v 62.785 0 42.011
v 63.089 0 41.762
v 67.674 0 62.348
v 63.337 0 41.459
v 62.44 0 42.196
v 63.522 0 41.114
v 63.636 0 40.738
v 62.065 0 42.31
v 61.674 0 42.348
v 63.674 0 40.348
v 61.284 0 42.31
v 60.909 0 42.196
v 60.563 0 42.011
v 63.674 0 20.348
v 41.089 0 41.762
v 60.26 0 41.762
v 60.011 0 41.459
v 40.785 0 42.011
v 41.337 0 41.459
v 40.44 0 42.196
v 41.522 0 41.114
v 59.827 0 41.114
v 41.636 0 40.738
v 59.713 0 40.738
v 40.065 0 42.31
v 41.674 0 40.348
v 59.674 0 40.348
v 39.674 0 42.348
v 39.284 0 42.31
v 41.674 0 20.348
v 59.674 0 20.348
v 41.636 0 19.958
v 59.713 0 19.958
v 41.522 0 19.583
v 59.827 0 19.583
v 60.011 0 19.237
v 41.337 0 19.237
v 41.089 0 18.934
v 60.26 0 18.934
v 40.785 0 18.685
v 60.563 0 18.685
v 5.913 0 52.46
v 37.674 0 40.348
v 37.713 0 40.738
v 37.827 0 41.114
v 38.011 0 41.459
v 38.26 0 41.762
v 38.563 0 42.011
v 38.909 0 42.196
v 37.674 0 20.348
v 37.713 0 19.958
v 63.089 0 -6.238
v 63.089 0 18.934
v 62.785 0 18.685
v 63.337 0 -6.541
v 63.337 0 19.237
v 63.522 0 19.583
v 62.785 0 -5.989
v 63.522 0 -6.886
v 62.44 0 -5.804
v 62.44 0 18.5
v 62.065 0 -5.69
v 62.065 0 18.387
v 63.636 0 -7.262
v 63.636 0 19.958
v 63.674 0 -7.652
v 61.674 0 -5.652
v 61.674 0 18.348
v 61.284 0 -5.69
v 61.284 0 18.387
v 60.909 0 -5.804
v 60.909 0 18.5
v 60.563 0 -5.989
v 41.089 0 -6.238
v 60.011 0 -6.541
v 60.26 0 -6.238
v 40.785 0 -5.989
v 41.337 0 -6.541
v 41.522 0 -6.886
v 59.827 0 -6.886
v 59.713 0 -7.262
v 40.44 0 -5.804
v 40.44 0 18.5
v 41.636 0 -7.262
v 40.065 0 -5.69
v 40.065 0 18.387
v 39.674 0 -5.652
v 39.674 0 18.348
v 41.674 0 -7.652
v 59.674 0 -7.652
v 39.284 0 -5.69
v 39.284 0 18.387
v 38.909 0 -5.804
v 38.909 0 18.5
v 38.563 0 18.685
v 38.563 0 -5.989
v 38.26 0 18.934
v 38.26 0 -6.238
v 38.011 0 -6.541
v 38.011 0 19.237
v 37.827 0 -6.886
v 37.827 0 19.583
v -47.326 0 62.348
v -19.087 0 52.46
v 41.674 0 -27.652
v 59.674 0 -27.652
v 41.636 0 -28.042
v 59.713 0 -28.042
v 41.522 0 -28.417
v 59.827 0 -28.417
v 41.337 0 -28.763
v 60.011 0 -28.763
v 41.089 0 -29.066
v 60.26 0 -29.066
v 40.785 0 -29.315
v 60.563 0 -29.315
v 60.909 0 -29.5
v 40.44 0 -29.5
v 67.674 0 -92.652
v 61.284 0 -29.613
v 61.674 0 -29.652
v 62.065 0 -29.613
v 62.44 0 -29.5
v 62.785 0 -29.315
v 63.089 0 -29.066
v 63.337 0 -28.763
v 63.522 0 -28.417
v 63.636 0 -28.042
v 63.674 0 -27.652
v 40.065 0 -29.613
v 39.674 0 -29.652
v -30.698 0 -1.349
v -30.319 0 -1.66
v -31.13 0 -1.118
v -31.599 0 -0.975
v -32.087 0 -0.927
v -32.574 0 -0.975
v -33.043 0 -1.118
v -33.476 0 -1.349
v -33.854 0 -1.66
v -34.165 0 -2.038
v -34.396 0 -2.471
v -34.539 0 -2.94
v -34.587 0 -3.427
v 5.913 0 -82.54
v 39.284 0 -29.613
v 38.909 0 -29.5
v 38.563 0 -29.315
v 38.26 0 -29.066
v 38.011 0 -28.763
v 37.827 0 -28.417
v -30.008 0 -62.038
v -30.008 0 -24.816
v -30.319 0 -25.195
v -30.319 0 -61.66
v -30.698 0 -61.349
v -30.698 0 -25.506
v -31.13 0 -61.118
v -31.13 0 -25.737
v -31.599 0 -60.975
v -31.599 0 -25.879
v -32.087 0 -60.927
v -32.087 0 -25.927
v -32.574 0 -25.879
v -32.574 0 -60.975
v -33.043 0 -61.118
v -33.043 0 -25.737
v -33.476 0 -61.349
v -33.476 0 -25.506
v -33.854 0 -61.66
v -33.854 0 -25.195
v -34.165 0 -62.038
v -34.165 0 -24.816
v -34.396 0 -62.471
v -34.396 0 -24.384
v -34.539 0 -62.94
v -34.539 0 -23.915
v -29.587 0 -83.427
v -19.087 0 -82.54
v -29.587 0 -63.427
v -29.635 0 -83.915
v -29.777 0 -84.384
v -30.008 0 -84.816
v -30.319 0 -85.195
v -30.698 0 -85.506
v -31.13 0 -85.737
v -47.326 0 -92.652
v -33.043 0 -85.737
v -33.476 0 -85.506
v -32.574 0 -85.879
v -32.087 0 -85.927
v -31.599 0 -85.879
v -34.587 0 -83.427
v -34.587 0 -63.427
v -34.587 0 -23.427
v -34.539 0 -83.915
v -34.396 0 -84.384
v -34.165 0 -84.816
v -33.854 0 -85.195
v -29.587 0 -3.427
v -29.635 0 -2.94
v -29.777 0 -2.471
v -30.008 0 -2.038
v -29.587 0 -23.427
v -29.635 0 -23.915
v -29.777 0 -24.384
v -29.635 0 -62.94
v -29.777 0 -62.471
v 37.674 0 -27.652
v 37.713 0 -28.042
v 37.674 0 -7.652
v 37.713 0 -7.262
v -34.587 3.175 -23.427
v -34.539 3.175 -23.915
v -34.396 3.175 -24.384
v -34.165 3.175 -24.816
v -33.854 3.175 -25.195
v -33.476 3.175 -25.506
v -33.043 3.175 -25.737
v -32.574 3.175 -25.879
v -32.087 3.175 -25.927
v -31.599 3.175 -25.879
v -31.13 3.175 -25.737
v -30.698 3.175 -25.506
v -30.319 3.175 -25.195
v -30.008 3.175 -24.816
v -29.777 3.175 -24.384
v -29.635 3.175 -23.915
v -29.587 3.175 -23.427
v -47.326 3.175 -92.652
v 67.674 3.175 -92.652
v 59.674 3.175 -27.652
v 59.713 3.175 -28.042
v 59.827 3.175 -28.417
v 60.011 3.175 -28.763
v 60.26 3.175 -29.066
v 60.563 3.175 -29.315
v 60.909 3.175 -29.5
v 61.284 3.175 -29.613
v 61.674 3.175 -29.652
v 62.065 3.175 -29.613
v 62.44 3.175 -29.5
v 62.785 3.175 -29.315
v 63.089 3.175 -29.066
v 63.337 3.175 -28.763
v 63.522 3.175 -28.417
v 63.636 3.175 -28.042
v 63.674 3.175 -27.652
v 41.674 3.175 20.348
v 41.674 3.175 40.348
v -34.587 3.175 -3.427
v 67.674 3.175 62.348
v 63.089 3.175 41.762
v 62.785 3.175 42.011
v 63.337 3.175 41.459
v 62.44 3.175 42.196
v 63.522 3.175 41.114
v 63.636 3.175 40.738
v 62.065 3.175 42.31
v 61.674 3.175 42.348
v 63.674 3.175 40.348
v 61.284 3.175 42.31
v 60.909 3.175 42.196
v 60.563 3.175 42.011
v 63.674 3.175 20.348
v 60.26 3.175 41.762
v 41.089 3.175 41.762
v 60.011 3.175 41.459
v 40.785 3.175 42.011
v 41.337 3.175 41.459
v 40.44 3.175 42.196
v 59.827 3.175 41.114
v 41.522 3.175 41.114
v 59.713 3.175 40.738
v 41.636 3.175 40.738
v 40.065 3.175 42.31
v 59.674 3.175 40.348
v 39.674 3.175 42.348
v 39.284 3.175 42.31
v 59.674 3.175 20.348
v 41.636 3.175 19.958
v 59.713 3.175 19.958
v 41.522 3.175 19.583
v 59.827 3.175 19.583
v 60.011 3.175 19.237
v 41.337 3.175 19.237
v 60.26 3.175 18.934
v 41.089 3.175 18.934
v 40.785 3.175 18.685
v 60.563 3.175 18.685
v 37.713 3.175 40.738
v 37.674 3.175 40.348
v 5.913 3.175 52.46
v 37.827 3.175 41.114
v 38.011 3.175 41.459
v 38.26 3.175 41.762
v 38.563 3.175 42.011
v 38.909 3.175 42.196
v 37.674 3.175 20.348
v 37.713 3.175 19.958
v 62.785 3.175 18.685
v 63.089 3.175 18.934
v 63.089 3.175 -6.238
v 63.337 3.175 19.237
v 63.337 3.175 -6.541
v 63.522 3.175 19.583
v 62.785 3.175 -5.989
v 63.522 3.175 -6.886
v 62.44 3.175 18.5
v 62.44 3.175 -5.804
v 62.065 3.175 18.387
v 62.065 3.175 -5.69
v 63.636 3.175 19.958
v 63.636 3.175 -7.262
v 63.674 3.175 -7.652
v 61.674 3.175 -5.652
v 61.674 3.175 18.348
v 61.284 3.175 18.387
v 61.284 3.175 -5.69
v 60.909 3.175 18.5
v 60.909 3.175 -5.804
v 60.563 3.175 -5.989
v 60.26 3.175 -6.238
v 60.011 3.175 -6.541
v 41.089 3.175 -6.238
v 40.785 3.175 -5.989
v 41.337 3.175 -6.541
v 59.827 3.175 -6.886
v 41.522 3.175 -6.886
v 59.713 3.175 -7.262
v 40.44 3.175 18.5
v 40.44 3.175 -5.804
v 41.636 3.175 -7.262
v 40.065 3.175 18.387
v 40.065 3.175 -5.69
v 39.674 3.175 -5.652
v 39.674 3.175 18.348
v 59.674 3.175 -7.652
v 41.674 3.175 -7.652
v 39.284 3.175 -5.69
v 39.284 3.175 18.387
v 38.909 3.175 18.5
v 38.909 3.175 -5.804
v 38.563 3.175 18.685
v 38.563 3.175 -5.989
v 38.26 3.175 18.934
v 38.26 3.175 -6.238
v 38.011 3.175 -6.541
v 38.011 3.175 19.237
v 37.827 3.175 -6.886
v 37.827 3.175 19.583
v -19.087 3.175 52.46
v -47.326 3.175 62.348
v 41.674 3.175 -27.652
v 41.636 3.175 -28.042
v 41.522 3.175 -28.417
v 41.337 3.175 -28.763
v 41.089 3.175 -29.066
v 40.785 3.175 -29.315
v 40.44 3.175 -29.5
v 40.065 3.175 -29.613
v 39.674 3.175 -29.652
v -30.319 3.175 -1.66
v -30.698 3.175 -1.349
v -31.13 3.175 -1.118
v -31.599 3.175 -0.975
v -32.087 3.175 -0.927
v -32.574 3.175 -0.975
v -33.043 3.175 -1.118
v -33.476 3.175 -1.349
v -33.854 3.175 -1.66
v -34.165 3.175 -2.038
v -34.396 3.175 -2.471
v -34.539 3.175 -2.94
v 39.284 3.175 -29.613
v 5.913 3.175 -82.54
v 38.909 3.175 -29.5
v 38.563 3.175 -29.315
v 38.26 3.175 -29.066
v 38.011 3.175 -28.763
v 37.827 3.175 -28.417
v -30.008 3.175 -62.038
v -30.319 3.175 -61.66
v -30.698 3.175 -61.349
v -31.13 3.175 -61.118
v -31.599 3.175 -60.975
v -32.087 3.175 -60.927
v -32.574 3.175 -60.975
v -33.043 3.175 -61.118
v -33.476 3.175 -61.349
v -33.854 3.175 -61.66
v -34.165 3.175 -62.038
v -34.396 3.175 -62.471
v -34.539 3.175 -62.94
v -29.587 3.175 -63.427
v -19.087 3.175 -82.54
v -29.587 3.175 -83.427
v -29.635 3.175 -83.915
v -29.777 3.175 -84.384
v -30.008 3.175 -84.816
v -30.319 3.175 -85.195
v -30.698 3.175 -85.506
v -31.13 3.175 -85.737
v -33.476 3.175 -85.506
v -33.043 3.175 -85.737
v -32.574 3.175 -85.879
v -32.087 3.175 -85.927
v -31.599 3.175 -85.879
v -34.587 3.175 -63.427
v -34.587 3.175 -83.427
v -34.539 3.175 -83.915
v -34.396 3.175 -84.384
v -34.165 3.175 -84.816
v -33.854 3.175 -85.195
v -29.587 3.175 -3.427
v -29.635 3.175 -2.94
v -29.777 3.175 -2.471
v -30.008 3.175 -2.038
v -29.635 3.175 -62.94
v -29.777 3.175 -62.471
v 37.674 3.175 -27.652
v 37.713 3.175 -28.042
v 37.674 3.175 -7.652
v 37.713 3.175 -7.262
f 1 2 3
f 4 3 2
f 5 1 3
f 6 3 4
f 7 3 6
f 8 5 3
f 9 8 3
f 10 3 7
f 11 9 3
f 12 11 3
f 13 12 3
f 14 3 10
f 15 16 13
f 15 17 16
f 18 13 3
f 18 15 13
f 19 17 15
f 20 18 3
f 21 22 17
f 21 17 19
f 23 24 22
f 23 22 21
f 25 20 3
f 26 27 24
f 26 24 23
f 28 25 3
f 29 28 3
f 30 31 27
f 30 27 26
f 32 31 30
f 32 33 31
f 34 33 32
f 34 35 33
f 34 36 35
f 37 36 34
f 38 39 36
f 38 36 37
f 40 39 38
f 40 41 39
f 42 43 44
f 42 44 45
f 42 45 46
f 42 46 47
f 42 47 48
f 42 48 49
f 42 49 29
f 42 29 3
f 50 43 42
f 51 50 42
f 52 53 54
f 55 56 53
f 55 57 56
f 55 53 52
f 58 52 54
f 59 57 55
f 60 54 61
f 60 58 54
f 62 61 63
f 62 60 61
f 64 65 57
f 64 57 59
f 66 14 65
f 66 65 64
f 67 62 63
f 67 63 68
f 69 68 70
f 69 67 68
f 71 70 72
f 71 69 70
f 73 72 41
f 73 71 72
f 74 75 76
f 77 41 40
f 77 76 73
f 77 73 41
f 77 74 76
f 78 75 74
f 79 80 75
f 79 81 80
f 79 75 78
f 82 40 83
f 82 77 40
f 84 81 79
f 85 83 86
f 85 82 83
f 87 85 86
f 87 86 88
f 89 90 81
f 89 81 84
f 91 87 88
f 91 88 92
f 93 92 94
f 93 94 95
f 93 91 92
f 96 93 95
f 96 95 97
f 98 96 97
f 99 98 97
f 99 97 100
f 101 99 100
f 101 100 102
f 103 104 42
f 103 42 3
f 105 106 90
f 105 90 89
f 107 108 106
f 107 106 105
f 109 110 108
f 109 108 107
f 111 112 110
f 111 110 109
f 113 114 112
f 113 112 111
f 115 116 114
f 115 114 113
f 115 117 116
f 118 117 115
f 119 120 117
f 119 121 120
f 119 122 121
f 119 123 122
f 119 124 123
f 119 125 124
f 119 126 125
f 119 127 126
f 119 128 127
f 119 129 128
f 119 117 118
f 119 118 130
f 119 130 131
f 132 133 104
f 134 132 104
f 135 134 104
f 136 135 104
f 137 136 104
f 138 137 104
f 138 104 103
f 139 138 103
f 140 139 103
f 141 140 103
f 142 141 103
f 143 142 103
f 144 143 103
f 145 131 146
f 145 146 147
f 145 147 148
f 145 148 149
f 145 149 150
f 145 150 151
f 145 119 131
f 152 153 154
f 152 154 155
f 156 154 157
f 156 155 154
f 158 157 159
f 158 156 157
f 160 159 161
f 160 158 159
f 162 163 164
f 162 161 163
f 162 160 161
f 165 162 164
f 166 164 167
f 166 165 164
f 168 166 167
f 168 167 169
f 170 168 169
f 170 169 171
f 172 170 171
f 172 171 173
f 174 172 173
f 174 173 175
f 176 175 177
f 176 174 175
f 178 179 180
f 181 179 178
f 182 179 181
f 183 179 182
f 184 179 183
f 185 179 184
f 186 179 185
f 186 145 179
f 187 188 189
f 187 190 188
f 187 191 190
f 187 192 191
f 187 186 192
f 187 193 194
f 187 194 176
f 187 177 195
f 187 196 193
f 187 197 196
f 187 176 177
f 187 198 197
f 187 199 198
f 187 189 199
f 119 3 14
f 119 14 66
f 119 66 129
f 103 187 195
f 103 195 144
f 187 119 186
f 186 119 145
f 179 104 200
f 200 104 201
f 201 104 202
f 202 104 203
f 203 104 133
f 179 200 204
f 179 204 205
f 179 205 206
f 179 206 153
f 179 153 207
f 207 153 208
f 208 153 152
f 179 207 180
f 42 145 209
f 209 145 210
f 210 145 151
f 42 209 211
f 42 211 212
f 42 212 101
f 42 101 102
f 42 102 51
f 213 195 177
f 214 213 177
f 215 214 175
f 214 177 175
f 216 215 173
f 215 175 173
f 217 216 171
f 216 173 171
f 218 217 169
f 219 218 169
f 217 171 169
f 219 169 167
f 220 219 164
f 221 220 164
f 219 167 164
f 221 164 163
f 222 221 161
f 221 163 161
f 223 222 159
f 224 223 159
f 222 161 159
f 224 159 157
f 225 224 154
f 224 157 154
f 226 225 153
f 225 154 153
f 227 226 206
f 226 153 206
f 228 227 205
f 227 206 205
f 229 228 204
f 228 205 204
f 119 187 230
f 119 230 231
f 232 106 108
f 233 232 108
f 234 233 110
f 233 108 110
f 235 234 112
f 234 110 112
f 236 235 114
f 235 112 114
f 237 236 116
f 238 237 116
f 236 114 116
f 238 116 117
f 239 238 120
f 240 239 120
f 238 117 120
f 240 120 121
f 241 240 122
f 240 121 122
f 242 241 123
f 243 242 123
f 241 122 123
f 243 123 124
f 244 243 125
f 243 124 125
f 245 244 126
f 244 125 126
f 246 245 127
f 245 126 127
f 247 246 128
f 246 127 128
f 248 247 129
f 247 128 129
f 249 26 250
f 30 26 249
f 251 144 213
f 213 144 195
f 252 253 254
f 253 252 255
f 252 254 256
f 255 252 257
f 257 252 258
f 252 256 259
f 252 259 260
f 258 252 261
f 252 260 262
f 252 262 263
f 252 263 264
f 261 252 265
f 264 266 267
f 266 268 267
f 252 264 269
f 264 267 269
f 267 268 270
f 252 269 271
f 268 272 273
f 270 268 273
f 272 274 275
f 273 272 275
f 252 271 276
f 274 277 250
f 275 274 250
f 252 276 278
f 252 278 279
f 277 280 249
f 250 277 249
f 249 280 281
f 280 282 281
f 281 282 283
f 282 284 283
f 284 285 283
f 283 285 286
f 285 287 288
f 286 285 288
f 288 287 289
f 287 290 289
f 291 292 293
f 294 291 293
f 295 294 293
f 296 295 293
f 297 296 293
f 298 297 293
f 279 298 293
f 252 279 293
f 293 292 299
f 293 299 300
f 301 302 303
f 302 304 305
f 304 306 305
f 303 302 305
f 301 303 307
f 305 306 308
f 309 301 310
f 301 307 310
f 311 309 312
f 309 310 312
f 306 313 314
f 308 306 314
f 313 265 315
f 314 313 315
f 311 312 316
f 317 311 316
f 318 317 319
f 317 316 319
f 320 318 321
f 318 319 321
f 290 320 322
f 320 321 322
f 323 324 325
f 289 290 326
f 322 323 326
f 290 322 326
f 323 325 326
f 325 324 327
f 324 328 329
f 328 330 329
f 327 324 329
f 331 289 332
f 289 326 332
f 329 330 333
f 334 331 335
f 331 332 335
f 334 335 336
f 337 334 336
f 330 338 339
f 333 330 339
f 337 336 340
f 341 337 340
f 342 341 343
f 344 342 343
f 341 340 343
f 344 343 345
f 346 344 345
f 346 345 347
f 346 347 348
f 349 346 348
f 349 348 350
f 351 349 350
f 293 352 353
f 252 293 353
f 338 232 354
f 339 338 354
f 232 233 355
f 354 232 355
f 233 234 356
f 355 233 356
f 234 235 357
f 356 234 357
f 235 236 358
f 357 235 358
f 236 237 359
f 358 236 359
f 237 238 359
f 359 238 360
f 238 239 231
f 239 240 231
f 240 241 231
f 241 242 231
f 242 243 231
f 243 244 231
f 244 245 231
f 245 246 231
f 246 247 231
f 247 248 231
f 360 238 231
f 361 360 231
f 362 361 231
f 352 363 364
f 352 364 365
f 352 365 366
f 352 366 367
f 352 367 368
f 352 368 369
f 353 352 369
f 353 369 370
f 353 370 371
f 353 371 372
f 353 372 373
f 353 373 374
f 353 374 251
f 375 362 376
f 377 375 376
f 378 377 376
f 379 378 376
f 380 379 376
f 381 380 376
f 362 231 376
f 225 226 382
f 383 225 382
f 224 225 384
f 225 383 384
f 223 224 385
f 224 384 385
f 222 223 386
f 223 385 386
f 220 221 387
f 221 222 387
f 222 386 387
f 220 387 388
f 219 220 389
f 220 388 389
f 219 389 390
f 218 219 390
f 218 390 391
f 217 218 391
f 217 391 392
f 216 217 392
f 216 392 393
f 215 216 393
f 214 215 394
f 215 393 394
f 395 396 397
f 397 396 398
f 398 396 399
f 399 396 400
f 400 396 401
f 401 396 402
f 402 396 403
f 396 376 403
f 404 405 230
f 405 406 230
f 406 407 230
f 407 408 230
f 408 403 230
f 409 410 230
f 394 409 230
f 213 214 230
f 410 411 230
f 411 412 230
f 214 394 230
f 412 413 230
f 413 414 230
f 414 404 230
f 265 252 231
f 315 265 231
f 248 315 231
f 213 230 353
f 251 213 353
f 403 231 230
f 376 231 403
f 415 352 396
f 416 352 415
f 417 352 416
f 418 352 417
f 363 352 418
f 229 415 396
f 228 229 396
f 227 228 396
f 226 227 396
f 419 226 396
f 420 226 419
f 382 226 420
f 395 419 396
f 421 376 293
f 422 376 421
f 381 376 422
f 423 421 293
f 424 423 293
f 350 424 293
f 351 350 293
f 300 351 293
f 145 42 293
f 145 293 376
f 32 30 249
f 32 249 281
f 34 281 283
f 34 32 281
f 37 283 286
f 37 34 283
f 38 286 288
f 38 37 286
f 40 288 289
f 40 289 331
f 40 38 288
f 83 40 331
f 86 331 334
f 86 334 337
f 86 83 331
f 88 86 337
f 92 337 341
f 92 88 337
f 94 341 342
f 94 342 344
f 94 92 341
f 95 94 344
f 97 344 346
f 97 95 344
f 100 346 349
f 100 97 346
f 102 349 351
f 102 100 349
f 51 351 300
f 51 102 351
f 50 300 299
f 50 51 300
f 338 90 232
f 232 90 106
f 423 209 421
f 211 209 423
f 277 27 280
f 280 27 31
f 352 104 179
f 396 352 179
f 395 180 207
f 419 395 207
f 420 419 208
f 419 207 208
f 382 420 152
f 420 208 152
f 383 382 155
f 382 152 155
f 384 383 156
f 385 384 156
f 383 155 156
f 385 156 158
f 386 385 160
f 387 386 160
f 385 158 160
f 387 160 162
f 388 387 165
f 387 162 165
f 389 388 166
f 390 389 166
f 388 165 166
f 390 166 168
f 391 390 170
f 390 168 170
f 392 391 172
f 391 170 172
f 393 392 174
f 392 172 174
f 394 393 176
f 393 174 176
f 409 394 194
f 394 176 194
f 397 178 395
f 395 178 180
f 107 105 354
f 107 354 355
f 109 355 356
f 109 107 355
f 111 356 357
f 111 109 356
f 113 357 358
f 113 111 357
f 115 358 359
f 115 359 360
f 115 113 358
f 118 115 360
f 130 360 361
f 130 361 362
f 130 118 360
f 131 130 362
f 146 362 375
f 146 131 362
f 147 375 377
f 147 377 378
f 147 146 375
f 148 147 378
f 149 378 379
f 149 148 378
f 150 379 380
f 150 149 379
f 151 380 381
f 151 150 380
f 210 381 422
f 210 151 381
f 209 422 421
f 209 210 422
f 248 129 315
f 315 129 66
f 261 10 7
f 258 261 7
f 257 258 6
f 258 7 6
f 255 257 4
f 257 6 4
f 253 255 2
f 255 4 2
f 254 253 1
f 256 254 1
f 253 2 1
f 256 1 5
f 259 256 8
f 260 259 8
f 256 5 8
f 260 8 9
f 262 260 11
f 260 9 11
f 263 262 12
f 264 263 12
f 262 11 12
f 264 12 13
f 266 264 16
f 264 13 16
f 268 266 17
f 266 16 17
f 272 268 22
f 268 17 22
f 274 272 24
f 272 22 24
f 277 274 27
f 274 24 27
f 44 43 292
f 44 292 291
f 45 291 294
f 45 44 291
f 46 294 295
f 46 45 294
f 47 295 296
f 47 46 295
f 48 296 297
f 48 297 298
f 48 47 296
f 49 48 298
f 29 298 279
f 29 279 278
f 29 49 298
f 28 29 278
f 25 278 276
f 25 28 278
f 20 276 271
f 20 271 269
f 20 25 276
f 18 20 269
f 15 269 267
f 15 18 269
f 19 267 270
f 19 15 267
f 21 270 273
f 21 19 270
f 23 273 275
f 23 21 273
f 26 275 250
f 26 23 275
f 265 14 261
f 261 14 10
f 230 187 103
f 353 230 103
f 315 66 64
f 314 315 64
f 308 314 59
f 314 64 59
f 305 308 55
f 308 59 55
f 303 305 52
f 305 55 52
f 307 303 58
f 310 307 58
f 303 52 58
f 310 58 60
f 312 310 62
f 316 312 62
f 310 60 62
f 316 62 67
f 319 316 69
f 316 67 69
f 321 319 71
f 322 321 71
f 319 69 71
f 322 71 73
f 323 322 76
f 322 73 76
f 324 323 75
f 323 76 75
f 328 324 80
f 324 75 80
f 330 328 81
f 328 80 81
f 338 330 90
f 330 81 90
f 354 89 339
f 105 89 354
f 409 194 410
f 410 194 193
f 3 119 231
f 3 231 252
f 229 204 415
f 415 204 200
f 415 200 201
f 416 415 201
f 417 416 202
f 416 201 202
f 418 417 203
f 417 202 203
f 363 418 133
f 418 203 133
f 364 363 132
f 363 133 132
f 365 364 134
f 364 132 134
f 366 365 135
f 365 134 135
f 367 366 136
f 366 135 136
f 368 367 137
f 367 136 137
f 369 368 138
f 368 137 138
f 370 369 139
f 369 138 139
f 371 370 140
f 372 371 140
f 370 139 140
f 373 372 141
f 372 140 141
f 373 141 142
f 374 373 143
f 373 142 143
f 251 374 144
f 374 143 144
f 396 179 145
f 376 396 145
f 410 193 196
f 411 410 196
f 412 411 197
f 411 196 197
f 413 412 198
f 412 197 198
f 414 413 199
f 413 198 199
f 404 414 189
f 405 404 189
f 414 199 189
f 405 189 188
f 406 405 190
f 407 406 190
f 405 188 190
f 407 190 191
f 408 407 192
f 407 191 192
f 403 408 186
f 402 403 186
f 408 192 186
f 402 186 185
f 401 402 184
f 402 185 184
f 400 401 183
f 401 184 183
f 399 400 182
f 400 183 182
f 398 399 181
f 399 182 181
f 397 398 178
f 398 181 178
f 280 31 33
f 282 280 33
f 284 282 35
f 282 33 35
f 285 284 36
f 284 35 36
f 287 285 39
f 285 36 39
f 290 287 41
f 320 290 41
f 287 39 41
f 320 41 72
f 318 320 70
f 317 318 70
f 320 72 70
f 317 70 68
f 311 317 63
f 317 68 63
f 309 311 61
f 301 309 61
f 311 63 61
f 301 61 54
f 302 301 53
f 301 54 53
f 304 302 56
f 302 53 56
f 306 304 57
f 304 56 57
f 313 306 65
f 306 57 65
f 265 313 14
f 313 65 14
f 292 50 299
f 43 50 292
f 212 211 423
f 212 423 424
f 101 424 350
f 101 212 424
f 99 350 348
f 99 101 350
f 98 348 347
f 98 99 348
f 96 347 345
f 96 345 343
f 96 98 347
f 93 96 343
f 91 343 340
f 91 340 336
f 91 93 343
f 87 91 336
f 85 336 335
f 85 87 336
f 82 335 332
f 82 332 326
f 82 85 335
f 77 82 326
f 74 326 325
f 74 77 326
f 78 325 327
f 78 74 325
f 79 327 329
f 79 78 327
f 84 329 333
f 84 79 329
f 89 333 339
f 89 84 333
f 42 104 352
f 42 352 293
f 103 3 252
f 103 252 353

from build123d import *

# Parameters (mm, degrees)
SKETCH1_W           = 25
SKETCH1_H           = 135
BOSS_EXTRUDE1_DEPTH = 3.175


with BuildPart() as part:
    # Sketch1 → Boss-Extrude1 (new body)
    with BuildSketch(Plane(origin=(0, 0, 0), x_dir=(1, 0, 0), z_dir=(0, 1, 0))):
        Polygon((67.674333466, 92.651811553), (67.674333466, -62.348188447), (-47.325666534, -62.348188447), (-47.325666534, -27.044565342), (-47.325666534, 92.651811553), align=None)
        with Locations((-6.586624165, 15.039519235)):
            Rectangle(SKETCH1_W, SKETCH1_H, mode=Mode.SUBTRACT)
        with BuildLine():
            Line((-34.586624165, 63.427366475), (-34.586624165, 83.427366475))
            ThreePointArc((-34.586624165, 83.427366475), (-32.086624165, 85.927366475), (-29.586624165, 83.427366475))
            Line((-29.586624165, 83.427366475), (-29.586624165, 63.427366475))
            ThreePointArc((-29.586624165, 63.427366475), (-32.086624165, 60.927366475), (-34.586624165, 63.427366475))
        make_face(mode=Mode.SUBTRACT)
        with BuildLine():
            Line((-34.586624165, 3.427366475), (-34.586624165, 23.427366475))
            ThreePointArc((-34.586624165, 23.427366475), (-32.086624165, 25.927366475), (-29.586624165, 23.427366475))
            Line((-29.586624165, 23.427366475), (-29.586624165, 3.427366475))
            ThreePointArc((-29.586624165, 3.427366475), (-32.086624165, 0.927366475), (-34.586624165, 3.427366475))
        make_face(mode=Mode.SUBTRACT)
        with BuildLine():
            Line((59.674333466, 7.651811553), (59.674333466, 27.651811553))
            ThreePointArc((59.674333466, 27.651811553), (61.674333466, 29.651811553), (63.674333466, 27.651811553))
            Line((63.674333466, 27.651811553), (63.674333466, 7.651811553))
            ThreePointArc((63.674333466, 7.651811553), (61.674333466, 5.651811553), (59.674333466, 7.651811553))
        make_face(mode=Mode.SUBTRACT)
        with BuildLine():
            Line((59.674333466, -40.348188447), (59.674333466, -20.348188447))
            ThreePointArc((59.674333466, -20.348188447), (61.674333466, -18.348188447), (63.674333466, -20.348188447))
            Line((63.674333466, -20.348188447), (63.674333466, -40.348188447))
            ThreePointArc((63.674333466, -40.348188447), (61.674333466, -42.348188447), (59.674333466, -40.348188447))
        make_face(mode=Mode.SUBTRACT)
        with BuildLine():
            Line((41.674333466, 7.651811553), (41.674333466, 27.651811553))
            ThreePointArc((41.674333466, 27.651811553), (39.674333466, 29.651811553), (37.674333466, 27.651811553))
            Line((37.674333466, 27.651811553), (37.674333466, 7.651811553))
            ThreePointArc((37.674333466, 7.651811553), (39.674333466, 5.651811553), (41.674333466, 7.651811553))
        make_face(mode=Mode.SUBTRACT)
        with BuildLine():
            Line((41.674333466, -40.348188447), (41.674333466, -20.348188447))
            ThreePointArc((41.674333466, -20.348188447), (39.674333466, -18.348188447), (37.674333466, -20.348188447))
            Line((37.674333466, -20.348188447), (37.674333466, -40.348188447))
            ThreePointArc((37.674333466, -40.348188447), (39.674333466, -42.348188447), (41.674333466, -40.348188447))
        make_face(mode=Mode.SUBTRACT)
    extrude(amount=BOSS_EXTRUDE1_DEPTH)


solid = part.part
